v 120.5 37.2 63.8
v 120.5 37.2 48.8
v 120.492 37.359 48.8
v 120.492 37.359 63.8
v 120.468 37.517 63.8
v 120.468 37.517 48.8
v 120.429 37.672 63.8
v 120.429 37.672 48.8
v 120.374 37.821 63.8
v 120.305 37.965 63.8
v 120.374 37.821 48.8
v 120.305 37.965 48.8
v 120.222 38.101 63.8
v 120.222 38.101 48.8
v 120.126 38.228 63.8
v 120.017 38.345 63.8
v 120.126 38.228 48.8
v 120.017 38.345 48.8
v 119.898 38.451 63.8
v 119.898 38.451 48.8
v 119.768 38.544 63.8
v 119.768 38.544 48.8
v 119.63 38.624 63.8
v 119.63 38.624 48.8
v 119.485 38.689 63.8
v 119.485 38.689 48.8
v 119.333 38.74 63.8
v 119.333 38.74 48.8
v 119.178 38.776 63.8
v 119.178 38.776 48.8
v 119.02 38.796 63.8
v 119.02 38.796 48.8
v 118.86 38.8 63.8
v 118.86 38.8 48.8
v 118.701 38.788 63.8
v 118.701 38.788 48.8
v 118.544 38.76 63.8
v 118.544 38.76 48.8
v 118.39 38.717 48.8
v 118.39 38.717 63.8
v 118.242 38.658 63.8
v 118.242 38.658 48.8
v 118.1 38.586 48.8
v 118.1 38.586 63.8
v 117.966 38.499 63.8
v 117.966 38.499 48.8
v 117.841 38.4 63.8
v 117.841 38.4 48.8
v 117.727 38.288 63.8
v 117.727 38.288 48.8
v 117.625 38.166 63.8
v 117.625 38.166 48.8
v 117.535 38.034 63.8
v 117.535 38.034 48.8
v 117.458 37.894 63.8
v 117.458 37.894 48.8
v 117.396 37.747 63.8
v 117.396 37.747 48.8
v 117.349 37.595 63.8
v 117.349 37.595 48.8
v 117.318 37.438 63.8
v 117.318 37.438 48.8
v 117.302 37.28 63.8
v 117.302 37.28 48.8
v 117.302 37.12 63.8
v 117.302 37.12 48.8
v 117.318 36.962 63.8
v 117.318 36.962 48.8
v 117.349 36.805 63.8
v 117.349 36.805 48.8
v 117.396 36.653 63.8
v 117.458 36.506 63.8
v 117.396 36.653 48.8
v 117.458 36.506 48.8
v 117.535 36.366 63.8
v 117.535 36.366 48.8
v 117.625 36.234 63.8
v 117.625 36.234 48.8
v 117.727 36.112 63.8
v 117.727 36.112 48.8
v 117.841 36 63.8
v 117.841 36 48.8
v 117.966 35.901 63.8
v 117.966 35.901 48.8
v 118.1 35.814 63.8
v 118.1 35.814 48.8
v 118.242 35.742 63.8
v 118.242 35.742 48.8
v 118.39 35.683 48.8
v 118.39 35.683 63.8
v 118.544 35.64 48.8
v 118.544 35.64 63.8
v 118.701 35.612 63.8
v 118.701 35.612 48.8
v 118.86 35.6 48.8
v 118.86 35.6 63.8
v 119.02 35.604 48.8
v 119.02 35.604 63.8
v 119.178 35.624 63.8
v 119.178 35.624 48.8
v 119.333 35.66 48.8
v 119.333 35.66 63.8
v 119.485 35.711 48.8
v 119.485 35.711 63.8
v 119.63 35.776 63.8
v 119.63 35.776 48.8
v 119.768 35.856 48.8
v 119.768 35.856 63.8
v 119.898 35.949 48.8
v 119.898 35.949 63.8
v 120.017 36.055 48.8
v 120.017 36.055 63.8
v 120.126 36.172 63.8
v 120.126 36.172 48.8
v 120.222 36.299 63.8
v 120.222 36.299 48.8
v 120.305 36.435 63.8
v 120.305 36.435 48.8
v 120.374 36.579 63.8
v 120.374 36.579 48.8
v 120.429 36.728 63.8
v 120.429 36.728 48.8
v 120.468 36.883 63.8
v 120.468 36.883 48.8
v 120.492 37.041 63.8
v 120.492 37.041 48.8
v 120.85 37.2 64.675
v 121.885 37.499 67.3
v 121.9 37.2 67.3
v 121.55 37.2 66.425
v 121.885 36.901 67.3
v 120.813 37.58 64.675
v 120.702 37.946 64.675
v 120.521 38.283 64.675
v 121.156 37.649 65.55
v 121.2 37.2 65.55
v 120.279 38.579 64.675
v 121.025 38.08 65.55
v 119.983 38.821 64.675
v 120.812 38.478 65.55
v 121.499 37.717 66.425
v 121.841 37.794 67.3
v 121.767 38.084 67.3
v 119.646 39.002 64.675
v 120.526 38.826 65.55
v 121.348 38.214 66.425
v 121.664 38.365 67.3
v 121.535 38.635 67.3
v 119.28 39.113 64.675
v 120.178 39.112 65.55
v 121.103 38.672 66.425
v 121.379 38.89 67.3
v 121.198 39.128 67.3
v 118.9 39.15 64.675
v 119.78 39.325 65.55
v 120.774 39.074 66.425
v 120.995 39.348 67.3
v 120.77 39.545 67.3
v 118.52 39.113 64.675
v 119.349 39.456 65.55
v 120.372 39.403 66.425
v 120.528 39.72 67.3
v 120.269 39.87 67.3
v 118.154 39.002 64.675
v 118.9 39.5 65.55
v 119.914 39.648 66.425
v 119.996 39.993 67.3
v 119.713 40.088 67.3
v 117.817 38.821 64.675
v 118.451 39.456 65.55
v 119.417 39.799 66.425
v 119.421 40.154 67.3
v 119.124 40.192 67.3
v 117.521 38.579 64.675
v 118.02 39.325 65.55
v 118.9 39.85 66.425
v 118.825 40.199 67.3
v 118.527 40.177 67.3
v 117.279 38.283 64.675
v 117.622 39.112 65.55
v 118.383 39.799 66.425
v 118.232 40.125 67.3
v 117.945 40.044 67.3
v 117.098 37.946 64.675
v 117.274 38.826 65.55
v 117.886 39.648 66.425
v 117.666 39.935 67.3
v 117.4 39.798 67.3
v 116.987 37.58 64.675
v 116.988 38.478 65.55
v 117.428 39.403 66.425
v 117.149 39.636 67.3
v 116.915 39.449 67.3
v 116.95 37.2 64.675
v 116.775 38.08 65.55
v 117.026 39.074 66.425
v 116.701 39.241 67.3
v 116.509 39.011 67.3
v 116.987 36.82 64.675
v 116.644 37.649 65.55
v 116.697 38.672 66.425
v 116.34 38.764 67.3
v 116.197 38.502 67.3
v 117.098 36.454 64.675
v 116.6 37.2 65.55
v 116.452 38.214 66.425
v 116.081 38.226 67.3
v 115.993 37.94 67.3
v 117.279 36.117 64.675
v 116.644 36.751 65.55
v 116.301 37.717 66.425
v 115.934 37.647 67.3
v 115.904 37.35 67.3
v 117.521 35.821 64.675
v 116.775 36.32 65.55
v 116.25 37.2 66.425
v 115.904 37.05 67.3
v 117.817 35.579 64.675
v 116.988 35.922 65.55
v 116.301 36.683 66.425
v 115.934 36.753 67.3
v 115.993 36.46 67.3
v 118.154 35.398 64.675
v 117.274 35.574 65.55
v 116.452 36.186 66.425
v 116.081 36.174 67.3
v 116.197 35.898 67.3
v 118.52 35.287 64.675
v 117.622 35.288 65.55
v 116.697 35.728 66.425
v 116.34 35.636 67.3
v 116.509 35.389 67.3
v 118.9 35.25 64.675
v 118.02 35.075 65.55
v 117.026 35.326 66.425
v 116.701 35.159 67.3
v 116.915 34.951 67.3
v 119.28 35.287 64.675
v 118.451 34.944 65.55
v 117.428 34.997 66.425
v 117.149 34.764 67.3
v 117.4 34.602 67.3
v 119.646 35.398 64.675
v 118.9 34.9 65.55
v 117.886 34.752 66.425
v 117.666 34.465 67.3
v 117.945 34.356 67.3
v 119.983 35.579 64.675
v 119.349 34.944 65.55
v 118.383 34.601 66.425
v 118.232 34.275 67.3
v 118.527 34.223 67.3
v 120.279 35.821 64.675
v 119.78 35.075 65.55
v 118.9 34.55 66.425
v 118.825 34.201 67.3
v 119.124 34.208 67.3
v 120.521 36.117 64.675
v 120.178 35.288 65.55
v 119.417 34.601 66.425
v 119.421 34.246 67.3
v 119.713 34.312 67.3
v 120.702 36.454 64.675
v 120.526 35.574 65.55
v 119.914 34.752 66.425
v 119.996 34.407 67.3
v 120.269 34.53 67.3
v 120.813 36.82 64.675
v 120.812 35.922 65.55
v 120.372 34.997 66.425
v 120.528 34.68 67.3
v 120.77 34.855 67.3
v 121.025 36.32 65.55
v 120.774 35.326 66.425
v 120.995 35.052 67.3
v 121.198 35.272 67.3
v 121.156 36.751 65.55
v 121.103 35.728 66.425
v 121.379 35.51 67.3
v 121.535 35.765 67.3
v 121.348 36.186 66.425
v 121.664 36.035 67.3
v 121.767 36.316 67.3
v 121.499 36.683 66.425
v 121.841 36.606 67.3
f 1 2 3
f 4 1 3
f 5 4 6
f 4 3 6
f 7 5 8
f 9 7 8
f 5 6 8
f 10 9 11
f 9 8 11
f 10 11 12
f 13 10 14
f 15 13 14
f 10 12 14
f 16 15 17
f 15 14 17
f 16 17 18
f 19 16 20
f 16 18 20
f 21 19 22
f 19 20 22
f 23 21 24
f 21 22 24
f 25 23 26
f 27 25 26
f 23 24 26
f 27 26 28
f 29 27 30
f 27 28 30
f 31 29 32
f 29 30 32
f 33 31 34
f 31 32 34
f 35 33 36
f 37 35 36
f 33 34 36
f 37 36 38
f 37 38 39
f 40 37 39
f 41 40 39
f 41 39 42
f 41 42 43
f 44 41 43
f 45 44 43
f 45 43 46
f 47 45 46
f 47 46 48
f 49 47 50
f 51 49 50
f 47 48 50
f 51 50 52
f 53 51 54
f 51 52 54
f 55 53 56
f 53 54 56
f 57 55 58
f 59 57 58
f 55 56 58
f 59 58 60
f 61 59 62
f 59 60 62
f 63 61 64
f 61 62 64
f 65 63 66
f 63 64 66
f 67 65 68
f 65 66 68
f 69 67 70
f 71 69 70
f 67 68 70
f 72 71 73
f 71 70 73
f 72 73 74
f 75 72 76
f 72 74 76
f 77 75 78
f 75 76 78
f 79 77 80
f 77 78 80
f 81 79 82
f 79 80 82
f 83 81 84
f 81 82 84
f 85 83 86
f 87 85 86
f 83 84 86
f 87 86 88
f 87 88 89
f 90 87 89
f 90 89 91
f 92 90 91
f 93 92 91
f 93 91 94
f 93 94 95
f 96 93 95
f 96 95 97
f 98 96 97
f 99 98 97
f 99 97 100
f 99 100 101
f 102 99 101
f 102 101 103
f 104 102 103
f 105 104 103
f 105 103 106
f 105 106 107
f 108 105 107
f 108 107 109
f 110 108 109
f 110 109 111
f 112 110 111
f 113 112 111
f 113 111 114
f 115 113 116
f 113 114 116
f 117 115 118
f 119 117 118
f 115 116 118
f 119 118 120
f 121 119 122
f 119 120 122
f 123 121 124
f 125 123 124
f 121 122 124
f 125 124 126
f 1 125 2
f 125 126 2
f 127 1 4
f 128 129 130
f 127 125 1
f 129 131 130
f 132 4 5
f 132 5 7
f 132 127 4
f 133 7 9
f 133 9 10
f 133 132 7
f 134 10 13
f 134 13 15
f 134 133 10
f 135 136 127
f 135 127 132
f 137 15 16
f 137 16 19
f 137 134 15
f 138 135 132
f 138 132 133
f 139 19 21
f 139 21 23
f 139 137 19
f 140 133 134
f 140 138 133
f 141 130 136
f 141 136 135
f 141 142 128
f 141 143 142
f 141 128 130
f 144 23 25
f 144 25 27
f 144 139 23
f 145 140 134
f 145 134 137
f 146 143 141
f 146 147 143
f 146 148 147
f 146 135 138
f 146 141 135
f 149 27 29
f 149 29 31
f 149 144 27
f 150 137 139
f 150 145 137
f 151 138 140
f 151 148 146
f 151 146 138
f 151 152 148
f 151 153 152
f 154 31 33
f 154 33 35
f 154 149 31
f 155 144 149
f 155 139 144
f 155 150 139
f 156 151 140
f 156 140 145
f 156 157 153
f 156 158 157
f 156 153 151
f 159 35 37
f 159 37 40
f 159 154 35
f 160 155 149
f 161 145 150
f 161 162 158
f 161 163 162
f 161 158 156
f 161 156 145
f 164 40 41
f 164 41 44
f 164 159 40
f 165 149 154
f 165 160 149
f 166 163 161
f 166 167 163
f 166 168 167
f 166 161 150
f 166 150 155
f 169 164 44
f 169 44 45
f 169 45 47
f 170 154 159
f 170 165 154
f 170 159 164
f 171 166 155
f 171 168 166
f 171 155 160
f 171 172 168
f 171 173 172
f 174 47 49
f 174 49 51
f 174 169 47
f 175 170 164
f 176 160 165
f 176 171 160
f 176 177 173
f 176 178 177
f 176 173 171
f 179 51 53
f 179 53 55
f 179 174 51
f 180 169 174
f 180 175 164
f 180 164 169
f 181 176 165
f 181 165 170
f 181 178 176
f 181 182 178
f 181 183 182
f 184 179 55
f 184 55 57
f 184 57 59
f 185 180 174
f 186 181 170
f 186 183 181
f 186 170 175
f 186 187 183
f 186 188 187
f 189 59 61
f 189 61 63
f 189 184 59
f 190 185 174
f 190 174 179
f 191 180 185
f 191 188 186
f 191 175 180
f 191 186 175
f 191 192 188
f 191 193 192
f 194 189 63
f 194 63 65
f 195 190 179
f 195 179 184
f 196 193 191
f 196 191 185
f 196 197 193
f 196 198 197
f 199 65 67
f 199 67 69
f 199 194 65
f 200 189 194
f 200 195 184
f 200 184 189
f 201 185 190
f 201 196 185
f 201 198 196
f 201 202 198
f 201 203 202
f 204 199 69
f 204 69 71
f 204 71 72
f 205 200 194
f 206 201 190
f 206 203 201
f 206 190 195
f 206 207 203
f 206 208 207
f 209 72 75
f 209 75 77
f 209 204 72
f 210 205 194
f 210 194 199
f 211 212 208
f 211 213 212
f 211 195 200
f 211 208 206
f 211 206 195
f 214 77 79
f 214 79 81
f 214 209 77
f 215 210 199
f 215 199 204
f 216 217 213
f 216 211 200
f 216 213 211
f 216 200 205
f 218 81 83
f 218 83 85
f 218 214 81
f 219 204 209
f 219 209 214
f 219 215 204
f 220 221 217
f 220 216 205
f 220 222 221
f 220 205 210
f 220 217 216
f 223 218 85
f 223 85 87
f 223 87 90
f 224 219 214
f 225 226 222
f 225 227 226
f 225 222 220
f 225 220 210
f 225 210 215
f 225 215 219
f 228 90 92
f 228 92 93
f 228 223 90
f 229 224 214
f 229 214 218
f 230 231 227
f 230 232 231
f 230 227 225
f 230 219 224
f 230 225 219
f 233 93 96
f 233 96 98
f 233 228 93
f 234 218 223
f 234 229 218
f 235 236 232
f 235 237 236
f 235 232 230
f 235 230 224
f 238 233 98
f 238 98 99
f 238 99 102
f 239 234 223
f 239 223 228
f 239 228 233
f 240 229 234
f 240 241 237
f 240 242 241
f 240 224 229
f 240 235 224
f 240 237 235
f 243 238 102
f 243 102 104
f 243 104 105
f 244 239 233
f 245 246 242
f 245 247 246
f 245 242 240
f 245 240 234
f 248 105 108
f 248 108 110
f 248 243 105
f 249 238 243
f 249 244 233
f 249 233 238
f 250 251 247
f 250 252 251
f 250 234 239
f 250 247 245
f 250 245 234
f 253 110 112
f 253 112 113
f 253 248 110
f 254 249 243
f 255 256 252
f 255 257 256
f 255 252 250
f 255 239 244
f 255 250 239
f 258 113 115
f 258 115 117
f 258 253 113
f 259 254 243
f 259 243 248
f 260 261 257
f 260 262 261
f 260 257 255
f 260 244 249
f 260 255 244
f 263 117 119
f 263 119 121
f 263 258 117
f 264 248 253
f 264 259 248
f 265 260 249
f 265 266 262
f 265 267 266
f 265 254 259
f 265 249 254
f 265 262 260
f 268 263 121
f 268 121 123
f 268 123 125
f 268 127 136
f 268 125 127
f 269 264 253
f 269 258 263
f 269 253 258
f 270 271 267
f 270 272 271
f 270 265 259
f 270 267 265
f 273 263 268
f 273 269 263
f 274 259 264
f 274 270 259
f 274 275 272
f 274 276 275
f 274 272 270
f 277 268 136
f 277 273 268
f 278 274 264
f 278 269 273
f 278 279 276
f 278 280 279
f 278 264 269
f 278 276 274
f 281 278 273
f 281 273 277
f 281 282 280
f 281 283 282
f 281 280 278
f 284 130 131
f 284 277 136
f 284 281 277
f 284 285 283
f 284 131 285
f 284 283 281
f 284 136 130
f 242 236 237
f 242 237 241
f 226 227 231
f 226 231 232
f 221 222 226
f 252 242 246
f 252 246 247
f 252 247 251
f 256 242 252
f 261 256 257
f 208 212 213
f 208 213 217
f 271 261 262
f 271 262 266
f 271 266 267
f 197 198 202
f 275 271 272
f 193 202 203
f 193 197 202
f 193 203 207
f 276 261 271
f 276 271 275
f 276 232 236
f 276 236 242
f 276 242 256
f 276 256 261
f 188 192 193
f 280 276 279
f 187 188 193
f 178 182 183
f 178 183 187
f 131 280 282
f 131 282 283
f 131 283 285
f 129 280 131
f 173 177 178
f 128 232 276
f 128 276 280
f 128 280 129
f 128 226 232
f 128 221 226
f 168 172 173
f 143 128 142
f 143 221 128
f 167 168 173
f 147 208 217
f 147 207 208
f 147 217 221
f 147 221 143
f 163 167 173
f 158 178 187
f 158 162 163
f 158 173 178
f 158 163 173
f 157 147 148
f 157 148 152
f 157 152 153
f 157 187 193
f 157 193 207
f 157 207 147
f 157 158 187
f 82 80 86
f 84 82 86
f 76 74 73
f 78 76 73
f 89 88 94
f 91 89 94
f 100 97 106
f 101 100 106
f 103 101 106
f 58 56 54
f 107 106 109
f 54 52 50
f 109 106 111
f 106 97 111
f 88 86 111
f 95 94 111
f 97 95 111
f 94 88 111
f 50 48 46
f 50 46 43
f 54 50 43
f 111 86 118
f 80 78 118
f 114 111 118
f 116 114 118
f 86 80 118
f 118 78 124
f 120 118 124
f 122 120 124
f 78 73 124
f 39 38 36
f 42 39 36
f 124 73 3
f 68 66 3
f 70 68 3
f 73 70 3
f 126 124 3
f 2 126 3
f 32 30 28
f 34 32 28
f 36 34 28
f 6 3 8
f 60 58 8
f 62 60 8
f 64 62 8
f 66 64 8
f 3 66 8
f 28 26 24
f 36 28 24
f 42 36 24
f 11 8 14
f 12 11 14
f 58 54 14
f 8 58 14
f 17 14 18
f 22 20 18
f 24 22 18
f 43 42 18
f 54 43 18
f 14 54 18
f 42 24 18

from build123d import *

# Parameters (mm, degrees)
CYLINDER111_R     = 1.6
CYLINDER111_DEPTH = 15


with BuildPart() as cylinder111:
    # Cylinder111 → Cylinder111 (new body)
    with BuildSketch(Plane.XY):
        Circle(CYLINDER111_R)
    extrude(amount=CYLINDER111_DEPTH)


with BuildPart() as fusion045:
    # Cone013 → Cone013 (revolve)
    with BuildSketch(Plane(origin=(0, 0, 15), x_dir=(1, 0, 0), z_dir=(0, -1, 0))):
        Polygon((0, 0), (1.6, 0), (3, 3.5), (0, 3.5), align=None)
    revolve(axis=Axis((0, 0, 15), (0, 0, 1)))

    # Fusion045: union Cylinder111
    add(cylinder111.part)


with BuildPart() as fusion045_1:
    # Fusion045 placement: moved
    add(fusion045.part.moved(Location((118.9, 37.2, 48.8))))


solid = fusion045_1.part
